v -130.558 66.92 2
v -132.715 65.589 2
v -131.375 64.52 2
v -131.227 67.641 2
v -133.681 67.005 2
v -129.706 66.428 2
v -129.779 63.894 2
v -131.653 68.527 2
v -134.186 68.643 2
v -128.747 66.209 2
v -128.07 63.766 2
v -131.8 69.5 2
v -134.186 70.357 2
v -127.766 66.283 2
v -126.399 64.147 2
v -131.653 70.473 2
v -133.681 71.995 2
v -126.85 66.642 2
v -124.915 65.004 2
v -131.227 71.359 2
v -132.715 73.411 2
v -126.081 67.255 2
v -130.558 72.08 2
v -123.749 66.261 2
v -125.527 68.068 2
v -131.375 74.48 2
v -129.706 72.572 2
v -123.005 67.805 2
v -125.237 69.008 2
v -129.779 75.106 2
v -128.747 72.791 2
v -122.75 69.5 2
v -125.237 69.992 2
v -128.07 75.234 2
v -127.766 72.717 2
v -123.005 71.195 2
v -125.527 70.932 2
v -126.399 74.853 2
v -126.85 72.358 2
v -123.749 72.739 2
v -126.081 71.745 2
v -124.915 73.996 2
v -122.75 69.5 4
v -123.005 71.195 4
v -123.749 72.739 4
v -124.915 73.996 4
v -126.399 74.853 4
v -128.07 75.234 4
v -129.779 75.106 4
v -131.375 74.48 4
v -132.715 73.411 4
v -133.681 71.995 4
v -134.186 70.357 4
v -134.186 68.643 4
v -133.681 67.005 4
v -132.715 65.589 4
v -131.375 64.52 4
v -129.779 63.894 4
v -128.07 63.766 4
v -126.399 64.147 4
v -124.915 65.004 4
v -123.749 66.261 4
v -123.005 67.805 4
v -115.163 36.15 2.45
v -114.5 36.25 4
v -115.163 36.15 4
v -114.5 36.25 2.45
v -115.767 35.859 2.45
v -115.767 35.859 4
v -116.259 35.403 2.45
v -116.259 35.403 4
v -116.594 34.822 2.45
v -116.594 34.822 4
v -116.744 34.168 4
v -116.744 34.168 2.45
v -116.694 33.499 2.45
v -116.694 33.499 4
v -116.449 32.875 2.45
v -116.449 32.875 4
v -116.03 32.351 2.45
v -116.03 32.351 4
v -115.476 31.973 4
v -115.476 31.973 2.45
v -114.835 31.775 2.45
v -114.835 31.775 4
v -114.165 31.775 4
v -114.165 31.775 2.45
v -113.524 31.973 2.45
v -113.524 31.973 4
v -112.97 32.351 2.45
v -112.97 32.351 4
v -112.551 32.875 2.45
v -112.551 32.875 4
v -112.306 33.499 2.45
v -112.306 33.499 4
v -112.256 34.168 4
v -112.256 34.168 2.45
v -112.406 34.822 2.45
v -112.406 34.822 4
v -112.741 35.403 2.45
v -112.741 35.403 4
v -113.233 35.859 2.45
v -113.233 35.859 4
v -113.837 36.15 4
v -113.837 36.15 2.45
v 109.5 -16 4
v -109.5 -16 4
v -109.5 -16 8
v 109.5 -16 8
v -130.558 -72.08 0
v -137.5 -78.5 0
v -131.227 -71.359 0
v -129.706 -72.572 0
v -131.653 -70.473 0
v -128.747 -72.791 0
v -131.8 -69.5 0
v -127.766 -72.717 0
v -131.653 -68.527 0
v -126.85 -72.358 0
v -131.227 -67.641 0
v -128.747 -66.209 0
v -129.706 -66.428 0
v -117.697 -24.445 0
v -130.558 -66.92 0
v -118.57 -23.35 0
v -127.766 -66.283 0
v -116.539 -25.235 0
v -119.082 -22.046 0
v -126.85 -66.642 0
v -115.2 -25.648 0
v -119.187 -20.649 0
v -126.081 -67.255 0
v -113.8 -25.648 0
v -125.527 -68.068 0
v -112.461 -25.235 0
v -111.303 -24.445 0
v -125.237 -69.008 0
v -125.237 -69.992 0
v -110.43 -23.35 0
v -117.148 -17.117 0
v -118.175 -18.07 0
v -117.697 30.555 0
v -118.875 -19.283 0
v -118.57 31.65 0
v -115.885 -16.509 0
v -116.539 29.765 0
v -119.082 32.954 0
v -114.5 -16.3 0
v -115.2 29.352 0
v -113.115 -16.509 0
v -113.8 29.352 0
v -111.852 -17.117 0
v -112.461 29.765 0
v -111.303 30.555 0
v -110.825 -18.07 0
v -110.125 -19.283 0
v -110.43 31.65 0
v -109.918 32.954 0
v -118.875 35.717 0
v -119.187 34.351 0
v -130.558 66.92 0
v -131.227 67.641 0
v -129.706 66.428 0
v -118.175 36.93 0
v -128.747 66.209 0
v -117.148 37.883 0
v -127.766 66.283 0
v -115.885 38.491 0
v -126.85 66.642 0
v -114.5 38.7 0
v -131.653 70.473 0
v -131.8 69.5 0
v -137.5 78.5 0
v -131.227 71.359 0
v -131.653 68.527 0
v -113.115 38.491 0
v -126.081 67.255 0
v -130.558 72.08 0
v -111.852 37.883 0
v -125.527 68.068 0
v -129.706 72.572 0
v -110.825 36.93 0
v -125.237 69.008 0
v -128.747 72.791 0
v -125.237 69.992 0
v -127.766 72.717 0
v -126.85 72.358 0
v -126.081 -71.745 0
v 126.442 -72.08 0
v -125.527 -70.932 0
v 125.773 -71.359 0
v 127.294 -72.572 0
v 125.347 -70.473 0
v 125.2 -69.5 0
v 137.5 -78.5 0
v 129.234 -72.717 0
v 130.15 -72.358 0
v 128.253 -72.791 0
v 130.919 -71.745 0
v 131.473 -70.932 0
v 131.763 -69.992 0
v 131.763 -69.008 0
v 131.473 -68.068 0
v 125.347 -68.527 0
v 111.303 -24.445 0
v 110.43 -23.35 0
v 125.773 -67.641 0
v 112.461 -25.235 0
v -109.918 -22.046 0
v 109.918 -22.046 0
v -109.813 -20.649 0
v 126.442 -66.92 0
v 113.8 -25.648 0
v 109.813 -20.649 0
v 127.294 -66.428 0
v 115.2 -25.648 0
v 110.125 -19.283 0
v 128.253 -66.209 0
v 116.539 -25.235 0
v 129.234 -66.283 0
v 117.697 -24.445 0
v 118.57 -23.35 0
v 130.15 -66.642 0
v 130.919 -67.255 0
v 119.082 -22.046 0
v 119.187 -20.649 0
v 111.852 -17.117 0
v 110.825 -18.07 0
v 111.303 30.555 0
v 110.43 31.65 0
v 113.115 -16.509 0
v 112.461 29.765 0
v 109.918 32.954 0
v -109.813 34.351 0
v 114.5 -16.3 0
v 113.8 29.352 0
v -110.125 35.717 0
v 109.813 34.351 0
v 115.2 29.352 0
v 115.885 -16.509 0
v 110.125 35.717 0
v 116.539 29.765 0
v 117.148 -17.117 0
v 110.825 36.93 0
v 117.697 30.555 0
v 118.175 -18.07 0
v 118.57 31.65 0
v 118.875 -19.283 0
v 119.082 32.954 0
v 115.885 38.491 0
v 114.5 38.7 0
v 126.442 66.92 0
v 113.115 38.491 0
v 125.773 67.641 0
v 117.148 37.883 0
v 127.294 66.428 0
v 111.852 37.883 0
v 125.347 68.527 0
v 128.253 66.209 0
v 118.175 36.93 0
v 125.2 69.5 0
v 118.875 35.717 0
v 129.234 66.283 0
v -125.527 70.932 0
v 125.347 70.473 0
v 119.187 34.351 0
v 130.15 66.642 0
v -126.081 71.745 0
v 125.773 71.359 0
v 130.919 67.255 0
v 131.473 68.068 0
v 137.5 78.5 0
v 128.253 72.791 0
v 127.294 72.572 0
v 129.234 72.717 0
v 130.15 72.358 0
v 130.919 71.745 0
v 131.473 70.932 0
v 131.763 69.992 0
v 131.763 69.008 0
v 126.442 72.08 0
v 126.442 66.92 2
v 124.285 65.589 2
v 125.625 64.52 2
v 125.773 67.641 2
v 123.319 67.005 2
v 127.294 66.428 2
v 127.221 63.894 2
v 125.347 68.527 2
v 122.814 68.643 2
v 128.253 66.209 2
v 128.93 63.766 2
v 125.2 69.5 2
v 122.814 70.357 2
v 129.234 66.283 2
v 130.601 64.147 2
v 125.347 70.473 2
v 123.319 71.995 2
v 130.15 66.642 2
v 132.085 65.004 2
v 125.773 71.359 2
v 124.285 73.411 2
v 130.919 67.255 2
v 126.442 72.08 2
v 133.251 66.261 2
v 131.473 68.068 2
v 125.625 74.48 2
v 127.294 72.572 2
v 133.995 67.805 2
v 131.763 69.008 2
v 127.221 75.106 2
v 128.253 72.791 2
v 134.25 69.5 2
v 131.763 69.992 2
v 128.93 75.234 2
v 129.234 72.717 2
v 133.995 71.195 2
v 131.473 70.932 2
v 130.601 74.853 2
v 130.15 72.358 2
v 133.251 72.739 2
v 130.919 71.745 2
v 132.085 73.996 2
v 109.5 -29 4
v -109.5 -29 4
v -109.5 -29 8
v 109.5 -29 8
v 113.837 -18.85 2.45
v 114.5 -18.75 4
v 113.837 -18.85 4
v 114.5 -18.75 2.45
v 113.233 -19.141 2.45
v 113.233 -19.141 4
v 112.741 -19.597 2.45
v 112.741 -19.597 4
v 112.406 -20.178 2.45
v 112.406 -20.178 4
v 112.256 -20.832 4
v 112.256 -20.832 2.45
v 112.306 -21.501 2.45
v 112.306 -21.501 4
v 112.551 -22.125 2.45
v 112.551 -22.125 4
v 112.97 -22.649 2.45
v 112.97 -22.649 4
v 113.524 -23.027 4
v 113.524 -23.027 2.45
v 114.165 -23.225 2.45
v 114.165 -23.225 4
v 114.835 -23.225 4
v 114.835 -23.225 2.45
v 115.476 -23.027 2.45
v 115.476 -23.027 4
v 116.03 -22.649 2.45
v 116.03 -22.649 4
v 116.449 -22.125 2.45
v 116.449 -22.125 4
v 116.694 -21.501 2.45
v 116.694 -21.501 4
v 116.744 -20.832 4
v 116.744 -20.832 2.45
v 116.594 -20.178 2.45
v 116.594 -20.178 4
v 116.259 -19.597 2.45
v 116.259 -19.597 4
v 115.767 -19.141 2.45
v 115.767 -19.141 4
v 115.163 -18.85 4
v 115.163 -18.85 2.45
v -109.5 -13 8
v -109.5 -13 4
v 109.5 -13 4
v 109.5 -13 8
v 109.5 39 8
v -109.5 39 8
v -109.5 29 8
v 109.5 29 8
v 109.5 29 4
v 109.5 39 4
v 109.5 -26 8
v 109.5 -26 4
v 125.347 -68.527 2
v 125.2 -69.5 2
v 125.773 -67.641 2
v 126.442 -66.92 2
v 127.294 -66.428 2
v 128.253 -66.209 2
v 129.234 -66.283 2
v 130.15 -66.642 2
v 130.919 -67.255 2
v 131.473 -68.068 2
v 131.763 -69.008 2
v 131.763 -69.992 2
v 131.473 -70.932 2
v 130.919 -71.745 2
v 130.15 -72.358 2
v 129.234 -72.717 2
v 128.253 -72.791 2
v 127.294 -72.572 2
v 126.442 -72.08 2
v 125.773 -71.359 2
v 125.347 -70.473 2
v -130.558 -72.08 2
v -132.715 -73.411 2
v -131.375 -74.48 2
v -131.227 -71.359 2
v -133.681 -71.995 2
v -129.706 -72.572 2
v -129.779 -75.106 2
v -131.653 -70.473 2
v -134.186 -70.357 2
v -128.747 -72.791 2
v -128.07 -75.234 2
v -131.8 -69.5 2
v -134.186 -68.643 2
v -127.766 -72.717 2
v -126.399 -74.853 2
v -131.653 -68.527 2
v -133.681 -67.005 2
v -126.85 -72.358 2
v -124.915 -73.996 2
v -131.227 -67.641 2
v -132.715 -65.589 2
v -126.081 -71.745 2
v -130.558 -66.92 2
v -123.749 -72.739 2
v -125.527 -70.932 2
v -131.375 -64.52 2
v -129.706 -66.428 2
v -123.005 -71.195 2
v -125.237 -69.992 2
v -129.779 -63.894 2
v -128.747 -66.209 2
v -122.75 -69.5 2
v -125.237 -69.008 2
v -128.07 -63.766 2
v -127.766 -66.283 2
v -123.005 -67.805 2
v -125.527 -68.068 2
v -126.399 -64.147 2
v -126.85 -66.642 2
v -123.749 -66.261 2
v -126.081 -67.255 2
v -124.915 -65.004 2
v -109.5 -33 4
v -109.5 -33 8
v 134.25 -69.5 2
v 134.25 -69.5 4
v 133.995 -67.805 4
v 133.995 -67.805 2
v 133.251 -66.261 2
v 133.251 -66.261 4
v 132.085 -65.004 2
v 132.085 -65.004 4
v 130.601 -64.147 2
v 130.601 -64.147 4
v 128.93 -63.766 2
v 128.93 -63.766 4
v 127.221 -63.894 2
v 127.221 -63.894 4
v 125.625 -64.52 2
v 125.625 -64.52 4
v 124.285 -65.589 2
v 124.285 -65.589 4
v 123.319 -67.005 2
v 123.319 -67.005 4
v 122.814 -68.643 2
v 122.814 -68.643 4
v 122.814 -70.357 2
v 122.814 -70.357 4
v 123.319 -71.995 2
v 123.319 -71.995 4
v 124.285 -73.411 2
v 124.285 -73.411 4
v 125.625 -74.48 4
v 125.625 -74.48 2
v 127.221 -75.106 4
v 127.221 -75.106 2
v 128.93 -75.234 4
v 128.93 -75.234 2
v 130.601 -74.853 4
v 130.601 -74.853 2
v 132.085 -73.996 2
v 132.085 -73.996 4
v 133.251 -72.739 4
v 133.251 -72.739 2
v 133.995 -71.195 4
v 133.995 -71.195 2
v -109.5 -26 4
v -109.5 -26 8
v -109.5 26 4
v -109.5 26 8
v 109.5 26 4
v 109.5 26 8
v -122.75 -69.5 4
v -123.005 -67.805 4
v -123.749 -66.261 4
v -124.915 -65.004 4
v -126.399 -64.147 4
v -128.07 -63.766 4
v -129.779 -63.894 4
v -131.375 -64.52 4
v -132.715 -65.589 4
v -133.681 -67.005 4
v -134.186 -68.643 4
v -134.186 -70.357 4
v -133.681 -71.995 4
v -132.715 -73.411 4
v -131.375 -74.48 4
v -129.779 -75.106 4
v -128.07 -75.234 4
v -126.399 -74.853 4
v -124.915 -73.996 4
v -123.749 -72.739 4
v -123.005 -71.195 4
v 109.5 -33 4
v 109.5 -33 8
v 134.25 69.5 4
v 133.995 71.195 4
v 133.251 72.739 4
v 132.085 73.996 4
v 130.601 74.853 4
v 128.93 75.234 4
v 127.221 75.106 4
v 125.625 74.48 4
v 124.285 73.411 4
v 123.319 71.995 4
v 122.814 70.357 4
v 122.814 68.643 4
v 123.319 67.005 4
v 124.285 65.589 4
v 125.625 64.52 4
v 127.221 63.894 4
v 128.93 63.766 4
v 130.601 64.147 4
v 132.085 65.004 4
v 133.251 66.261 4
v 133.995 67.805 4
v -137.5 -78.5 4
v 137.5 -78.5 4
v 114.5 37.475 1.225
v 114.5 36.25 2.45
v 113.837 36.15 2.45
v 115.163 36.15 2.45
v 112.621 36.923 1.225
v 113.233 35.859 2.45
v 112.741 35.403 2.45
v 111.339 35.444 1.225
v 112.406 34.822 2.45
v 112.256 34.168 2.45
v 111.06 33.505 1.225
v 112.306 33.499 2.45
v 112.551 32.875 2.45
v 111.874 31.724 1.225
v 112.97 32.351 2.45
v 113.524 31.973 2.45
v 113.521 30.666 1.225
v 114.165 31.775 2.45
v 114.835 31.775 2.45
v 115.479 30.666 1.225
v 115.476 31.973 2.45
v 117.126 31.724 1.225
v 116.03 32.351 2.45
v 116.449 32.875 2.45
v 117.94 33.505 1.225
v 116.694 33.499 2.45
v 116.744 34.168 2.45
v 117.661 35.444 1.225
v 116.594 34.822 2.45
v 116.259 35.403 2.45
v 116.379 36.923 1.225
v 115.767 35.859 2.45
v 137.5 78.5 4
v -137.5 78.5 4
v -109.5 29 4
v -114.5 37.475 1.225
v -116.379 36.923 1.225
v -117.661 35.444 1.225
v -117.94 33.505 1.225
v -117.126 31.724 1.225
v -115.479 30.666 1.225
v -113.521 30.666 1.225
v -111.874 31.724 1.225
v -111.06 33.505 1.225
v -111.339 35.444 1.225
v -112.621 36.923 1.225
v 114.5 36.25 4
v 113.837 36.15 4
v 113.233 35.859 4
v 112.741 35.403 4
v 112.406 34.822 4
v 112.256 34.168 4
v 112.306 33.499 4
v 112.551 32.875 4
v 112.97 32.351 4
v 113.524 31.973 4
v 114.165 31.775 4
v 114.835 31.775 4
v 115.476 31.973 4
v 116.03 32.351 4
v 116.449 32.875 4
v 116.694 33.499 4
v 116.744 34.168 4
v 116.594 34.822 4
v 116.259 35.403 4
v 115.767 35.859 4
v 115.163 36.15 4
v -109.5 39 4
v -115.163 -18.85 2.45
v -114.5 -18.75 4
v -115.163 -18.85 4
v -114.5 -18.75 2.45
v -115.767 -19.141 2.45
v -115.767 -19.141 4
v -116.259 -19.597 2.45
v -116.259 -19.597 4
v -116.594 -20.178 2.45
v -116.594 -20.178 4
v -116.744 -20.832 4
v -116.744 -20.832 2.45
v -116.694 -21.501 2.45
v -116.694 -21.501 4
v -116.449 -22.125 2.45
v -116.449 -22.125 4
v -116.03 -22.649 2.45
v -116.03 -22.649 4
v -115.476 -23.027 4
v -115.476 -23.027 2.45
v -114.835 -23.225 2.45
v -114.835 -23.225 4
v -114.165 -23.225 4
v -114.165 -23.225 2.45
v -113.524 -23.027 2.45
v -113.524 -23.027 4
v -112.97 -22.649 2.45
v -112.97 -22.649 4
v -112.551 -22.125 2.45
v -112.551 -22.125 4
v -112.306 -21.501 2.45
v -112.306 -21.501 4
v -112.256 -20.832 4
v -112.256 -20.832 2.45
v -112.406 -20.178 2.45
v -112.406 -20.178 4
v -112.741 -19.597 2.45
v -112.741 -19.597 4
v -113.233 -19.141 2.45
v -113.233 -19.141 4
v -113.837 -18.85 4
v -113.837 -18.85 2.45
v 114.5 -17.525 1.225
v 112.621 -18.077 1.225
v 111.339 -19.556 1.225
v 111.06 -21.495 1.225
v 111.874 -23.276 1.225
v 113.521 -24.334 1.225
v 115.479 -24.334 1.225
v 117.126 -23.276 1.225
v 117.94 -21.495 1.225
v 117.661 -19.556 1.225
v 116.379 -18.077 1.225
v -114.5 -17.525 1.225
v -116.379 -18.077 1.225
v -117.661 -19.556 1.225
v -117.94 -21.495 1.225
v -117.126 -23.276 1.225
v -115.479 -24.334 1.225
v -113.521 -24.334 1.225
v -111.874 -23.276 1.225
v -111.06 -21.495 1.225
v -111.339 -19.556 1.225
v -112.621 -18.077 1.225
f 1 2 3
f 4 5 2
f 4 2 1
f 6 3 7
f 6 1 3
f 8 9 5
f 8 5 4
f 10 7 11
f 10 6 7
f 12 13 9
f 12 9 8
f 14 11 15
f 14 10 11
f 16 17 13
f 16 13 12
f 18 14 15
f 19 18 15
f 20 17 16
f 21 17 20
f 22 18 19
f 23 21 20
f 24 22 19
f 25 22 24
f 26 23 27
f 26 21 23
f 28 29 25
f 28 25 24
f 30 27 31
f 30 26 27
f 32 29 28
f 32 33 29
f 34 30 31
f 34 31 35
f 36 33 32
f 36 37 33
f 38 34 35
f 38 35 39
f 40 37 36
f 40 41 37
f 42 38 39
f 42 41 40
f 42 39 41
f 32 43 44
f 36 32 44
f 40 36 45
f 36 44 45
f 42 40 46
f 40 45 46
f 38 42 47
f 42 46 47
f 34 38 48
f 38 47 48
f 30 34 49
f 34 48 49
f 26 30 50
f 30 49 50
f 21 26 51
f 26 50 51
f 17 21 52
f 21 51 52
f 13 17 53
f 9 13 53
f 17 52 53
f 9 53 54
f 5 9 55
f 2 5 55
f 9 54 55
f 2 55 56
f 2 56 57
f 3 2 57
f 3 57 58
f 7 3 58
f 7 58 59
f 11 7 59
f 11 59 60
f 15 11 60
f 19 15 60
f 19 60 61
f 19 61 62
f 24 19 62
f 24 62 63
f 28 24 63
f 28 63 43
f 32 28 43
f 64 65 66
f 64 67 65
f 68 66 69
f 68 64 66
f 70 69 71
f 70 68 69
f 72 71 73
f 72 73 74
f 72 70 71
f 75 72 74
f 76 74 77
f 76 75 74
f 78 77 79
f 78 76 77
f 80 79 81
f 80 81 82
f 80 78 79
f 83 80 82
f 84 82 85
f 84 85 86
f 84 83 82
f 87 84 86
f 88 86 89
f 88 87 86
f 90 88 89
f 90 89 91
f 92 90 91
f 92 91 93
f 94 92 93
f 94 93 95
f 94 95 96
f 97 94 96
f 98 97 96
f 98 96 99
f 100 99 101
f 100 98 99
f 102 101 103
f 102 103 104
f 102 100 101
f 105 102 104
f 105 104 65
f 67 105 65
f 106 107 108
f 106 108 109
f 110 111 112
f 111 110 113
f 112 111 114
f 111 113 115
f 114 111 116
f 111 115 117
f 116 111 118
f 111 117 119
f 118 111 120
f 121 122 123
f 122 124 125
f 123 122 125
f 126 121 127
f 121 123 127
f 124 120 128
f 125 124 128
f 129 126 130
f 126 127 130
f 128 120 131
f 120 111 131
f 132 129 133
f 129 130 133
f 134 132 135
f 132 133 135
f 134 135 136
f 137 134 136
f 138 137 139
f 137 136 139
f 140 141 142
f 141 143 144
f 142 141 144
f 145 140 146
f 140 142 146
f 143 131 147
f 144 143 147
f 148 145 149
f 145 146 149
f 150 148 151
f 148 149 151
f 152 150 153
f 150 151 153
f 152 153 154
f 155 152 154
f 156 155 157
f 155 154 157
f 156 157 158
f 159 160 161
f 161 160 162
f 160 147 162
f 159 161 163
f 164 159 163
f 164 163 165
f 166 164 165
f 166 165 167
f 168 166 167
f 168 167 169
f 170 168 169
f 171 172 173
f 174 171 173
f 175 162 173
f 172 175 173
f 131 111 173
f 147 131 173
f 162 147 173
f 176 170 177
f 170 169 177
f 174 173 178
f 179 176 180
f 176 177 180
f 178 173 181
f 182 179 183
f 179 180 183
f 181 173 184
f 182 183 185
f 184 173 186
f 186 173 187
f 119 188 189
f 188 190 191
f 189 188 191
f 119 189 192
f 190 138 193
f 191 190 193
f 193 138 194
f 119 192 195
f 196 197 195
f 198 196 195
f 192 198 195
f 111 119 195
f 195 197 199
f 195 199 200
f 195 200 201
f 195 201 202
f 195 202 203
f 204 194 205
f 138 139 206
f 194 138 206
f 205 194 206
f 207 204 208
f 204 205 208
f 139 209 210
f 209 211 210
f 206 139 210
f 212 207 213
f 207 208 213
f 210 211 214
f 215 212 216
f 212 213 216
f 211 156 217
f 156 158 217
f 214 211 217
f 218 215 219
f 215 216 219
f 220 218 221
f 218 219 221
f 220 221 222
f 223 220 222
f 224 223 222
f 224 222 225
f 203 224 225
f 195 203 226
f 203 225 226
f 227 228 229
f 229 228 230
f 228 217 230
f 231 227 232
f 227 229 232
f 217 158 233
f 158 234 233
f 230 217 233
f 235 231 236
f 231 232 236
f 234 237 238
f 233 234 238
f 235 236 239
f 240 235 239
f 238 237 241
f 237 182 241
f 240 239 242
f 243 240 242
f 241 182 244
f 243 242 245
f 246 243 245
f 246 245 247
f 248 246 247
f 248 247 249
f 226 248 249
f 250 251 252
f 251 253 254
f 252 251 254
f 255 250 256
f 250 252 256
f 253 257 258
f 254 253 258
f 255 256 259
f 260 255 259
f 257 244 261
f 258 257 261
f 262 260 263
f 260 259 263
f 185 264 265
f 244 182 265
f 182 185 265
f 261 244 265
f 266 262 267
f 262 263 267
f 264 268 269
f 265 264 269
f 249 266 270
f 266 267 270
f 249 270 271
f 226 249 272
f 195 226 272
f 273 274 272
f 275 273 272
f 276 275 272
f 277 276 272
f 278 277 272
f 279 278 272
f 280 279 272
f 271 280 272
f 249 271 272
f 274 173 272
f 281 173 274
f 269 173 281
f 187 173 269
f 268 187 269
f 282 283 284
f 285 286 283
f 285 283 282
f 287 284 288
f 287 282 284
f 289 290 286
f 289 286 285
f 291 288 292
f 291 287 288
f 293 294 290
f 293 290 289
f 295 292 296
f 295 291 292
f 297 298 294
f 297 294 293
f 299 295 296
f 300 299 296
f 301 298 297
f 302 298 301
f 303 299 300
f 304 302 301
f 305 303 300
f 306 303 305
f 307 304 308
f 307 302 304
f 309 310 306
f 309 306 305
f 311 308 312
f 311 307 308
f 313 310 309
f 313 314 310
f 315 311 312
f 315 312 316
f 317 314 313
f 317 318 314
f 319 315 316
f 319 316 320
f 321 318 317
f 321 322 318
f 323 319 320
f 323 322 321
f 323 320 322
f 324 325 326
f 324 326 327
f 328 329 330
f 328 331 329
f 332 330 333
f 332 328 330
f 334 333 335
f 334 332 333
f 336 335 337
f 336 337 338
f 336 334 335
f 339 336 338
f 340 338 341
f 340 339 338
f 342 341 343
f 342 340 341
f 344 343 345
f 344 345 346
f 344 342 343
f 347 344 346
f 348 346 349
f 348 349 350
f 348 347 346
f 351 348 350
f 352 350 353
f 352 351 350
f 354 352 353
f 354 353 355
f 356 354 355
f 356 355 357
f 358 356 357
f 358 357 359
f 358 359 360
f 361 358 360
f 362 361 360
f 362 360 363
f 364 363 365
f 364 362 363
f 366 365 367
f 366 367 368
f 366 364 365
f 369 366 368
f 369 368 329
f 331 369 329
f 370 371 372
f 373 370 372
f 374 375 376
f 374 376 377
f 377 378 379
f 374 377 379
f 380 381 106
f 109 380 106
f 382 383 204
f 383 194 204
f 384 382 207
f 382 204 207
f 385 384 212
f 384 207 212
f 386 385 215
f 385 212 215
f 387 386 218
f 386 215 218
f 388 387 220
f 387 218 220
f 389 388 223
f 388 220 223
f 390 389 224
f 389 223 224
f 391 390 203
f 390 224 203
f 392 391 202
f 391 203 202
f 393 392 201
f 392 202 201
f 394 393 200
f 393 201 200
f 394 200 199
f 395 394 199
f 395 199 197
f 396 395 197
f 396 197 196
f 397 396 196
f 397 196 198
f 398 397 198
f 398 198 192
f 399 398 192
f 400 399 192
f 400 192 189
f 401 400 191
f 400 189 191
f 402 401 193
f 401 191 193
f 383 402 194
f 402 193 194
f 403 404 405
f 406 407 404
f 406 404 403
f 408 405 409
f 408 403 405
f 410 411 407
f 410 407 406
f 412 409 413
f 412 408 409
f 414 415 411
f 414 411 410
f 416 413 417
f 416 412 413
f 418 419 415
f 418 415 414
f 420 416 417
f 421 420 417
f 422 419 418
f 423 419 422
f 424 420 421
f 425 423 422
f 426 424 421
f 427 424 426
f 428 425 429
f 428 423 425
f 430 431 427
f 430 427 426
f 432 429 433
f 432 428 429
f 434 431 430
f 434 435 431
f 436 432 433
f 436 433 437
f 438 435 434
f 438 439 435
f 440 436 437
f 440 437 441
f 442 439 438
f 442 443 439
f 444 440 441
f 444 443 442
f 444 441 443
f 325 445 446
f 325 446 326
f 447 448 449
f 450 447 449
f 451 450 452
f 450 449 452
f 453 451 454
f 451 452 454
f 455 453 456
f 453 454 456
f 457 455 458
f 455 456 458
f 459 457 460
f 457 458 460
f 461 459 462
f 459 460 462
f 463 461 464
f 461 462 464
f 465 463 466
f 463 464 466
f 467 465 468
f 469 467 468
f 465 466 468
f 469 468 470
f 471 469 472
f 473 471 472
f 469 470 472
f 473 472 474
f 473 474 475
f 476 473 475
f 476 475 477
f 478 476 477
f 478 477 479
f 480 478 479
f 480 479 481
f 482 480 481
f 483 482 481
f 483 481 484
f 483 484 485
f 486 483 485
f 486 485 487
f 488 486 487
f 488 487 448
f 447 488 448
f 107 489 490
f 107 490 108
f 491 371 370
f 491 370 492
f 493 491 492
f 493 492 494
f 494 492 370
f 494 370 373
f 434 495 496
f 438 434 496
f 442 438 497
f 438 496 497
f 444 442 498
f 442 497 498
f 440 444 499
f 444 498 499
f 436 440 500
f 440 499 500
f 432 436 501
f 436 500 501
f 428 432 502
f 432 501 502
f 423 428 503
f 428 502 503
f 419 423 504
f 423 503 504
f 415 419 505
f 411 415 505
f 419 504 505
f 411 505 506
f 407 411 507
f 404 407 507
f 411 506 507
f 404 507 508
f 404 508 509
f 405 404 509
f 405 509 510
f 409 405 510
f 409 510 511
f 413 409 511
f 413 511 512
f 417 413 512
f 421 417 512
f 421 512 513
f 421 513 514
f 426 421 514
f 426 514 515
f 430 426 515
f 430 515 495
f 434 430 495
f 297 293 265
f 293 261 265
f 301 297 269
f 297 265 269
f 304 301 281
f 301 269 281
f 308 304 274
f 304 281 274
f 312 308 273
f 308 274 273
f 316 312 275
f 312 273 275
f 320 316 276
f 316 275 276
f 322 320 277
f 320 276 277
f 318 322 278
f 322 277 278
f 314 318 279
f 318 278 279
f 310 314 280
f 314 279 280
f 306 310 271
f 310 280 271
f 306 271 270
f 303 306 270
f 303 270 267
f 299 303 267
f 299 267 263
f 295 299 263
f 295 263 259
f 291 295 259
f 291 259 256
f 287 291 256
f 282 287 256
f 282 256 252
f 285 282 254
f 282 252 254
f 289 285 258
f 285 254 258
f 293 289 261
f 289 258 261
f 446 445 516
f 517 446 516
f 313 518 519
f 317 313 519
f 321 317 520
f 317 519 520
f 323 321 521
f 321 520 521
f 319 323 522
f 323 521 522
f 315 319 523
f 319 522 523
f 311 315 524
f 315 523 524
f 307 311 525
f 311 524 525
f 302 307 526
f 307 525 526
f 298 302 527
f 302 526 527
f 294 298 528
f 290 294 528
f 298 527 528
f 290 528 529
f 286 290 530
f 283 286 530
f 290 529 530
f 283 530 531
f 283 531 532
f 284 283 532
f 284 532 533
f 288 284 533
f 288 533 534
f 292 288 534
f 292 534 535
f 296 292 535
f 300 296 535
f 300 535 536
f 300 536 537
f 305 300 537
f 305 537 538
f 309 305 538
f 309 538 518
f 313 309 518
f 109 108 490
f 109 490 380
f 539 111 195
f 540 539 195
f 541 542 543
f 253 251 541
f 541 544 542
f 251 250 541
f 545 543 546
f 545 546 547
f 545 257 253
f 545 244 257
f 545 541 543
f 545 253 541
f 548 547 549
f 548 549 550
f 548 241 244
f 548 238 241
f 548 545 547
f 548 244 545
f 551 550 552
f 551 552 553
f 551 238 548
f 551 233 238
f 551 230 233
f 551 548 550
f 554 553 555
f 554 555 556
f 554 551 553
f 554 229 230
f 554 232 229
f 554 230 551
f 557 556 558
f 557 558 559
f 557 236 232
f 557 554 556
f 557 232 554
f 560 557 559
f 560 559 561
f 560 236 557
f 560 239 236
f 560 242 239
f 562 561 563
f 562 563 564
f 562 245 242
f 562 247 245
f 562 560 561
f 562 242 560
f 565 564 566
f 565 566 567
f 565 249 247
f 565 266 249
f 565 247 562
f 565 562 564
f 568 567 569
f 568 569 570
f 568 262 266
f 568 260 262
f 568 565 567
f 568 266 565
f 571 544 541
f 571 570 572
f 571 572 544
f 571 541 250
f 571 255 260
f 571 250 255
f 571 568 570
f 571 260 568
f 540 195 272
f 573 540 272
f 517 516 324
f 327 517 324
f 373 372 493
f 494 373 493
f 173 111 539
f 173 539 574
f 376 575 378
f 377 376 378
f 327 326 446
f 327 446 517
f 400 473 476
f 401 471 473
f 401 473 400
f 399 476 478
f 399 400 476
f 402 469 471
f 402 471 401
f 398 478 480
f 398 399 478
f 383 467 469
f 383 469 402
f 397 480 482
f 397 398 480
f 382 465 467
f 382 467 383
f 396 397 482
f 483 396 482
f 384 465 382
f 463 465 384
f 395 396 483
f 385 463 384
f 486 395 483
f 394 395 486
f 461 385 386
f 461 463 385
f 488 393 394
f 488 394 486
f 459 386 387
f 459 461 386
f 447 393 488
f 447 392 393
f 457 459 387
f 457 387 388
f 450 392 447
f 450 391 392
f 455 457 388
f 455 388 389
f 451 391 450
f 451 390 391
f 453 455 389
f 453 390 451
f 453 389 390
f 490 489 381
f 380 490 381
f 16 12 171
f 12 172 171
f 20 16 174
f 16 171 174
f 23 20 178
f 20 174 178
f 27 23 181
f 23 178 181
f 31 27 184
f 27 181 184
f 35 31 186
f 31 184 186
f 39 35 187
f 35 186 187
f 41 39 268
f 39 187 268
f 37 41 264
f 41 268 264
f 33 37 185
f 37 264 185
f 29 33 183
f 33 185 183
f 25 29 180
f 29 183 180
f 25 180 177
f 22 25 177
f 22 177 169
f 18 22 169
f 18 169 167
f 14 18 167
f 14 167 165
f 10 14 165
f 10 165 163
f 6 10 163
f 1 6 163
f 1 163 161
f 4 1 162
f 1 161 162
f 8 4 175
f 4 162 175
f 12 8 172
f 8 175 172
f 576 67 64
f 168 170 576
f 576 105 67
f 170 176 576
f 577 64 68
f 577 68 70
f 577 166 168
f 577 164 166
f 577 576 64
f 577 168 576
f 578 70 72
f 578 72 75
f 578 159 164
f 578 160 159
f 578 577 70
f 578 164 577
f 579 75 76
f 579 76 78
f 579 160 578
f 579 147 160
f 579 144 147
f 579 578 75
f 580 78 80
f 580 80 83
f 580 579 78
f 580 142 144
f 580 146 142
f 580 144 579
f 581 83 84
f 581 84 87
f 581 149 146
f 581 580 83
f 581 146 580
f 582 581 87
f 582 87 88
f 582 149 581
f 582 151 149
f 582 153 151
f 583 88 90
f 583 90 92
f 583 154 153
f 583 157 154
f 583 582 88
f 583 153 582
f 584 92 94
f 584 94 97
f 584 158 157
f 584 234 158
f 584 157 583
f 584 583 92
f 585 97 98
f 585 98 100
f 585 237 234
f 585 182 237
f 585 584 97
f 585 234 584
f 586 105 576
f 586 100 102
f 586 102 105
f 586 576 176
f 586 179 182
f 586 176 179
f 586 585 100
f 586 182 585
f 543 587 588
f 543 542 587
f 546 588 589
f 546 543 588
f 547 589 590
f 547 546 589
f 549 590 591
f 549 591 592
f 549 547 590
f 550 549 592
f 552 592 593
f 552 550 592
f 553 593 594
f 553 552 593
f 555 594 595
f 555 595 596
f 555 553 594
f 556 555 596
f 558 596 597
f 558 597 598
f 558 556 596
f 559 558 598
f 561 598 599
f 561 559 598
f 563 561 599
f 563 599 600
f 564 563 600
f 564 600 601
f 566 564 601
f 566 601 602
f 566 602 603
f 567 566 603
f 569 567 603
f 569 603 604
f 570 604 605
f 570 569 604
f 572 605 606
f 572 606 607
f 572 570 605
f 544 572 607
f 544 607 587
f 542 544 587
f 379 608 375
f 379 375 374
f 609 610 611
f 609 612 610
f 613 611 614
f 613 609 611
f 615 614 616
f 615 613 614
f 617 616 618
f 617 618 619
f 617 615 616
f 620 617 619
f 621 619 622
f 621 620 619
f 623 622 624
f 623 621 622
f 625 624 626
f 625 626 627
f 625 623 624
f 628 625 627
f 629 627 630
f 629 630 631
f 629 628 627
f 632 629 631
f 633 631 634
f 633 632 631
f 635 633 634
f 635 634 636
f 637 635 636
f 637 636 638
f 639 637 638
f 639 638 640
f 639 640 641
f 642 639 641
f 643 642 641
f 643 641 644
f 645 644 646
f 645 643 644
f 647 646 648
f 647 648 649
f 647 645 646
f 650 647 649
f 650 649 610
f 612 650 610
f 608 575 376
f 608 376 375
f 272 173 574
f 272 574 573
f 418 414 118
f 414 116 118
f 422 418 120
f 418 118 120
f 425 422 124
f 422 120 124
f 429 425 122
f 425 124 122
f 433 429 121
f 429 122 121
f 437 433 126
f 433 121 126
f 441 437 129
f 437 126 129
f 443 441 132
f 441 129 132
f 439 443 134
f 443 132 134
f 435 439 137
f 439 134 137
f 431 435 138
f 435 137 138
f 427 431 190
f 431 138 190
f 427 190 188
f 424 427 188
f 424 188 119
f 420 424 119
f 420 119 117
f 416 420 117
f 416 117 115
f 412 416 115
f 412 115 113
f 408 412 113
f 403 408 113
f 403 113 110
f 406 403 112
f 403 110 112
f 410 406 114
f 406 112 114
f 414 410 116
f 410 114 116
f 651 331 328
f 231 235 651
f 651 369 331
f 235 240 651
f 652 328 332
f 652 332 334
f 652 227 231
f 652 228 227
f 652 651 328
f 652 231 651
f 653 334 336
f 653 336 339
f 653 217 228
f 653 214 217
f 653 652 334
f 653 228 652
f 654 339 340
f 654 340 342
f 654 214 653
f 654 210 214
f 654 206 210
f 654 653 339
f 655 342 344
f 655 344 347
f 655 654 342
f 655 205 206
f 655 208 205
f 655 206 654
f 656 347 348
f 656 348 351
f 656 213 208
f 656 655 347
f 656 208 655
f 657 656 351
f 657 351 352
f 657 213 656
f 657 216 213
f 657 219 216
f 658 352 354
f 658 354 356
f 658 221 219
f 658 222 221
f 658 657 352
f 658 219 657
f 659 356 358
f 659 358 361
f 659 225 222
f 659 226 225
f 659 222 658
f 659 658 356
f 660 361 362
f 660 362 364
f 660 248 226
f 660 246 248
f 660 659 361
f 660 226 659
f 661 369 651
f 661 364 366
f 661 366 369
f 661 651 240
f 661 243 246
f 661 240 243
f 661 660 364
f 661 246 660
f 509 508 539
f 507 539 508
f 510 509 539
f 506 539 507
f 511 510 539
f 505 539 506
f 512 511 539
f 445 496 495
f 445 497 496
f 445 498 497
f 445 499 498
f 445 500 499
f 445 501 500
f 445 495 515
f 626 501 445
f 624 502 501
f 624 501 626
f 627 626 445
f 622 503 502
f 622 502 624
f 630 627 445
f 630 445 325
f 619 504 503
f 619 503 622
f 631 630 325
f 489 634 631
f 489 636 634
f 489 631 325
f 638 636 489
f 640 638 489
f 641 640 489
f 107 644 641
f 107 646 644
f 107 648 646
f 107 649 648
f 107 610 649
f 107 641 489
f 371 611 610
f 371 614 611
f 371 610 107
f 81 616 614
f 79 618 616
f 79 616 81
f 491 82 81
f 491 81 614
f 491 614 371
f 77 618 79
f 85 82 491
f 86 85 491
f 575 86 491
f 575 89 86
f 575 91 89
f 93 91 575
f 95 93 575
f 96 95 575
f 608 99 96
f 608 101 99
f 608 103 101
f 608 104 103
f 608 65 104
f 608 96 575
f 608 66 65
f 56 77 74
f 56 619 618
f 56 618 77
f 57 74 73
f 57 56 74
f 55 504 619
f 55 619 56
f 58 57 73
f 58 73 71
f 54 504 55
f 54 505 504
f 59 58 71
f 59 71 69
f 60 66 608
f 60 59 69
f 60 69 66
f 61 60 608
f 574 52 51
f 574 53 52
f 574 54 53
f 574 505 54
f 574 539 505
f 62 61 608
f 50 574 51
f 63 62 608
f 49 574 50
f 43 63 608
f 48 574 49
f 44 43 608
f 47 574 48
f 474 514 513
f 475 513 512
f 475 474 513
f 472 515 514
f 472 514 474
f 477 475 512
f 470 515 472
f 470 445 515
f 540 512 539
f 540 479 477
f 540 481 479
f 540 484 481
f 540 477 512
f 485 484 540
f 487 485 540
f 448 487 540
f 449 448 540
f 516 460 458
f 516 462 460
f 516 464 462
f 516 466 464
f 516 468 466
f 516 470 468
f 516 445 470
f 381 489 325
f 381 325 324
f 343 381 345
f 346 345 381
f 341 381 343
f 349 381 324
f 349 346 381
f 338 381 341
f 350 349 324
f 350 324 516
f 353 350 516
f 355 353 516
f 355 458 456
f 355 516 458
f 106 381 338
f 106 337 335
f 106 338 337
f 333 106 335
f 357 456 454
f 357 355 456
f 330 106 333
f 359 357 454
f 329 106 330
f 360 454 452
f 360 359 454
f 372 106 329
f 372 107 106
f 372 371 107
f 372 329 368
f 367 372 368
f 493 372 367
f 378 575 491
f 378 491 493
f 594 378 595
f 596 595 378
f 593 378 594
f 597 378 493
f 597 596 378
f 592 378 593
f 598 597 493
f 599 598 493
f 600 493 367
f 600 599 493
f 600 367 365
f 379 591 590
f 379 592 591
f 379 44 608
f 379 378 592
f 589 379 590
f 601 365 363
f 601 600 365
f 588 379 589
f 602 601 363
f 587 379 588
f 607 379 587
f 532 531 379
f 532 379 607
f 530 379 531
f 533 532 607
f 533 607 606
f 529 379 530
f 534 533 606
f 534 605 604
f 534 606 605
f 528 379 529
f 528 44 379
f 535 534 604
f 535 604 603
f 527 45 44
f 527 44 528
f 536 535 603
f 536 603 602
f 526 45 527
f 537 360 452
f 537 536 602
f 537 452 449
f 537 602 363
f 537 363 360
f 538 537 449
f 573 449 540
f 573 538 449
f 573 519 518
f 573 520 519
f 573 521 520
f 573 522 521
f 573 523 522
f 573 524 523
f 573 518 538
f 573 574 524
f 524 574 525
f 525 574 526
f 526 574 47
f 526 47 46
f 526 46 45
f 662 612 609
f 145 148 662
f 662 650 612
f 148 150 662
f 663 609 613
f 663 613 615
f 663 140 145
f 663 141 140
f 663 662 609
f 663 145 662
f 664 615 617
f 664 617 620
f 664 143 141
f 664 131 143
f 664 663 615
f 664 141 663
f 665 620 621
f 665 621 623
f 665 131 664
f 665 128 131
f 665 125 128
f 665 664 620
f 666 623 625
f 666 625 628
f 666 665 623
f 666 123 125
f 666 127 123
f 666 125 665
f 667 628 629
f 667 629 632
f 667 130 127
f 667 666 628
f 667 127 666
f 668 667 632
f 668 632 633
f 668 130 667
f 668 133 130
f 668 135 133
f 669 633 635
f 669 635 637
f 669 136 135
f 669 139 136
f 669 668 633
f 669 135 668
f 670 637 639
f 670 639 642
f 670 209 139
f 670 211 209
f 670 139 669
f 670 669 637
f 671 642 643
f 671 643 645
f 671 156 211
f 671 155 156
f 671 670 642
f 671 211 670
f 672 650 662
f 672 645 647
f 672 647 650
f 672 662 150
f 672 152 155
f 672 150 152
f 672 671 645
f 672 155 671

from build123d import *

# Parameters (mm, degrees)
ESQUISSE4_W                                      = 275
ESQUISSE4_H                                      = 157
BOSS_EXTRU_2_DEPTH                               = 4
FRAISAGE_POUR_VIS_T_TE_FRAIS_E_M42_AT_COUNT      = 2
FRAISAGE_POUR_VIS_T_TE_FRAIS_E_M42_AT_PITCH      = 235.512207752
FRAISAGE_POUR_VIS_T_TE_FRAIS_E_M42_2_COUNT       = 2
FRAISAGE_POUR_VIS_T_TE_FRAIS_E_M42_2_PITCH       = 229
FRAISAGE_POUR_VIS_T_TE_FRAIS_E_M42_3_COUNT       = 2
FRAISAGE_POUR_VIS_T_TE_FRAIS_E_M42_3_PITCH       = 55
CHAMBRAGE_POUR_VIS_T_TE_RONDE_6_PANS_D           = 6.6
CHAMBRAGE_POUR_VIS_T_TE_RONDE_6_PANS_CBORE_D     = 11.5
CHAMBRAGE_POUR_VIS_T_TE_RONDE_6_PANS_CBORE_DEPTH = 2
ESQUISSE9_W                                      = 219
ESQUISSE9_H                                      = 10
ESQUISSE9_H_2                                    = 39
ESQUISSE9_H_3                                    = 4
BOSS_EXTRU_3_DEPTH                               = 4


with BuildPart() as part:
    # Esquisse4 → Boss.-Extru.2 (new body)
    with BuildSketch(Plane.XY):
        Rectangle(ESQUISSE4_W, ESQUISSE4_H)
    extrude(amount=BOSS_EXTRU_2_DEPTH)

    # Esquisse6 → Fraisage pour vis à tête fraisée M42 (revolve, cut)
    with BuildSketch(Plane(origin=(-114.5, -21, 0), x_dir=(0, 1, 0), z_dir=(1, 0, 0))):
        Polygon((0, 0), (0, 4), (2.25, 4), (2.25, 2.45), (4.7, 0), align=None)
    fraisage_pour_vis_t_te_frais_e_m42 = revolve(axis=Axis((-114.5, -21, -6.35), (0, 0, 1)), mode=Mode.SUBTRACT)

    # Fraisage pour vis à tête fraisée M42 at: Fraisage pour vis à tête fraisée M42 ×2
    with Locations(*[Vector(0.972348747, 0.233533542, 0) * (i * FRAISAGE_POUR_VIS_T_TE_FRAIS_E_M42_AT_PITCH) for i in range(1, FRAISAGE_POUR_VIS_T_TE_FRAIS_E_M42_AT_COUNT)]):
        add(fraisage_pour_vis_t_te_frais_e_m42, mode=Mode.SUBTRACT)

    # Fraisage pour vis _ t_te frais_e M42 2: Fraisage pour vis à tête fraisée M42 ×2
    with Locations(*[(i * FRAISAGE_POUR_VIS_T_TE_FRAIS_E_M42_2_PITCH, 0, 0) for i in range(1, FRAISAGE_POUR_VIS_T_TE_FRAIS_E_M42_2_COUNT)]):
        add(fraisage_pour_vis_t_te_frais_e_m42, mode=Mode.SUBTRACT)

    # Fraisage pour vis _ t_te frais_e M42 3: Fraisage pour vis à tête fraisée M42 ×2
    with Locations(*[(0, i * FRAISAGE_POUR_VIS_T_TE_FRAIS_E_M42_3_PITCH, 0) for i in range(1, FRAISAGE_POUR_VIS_T_TE_FRAIS_E_M42_3_COUNT)]):
        add(fraisage_pour_vis_t_te_frais_e_m42, mode=Mode.SUBTRACT)

    # Chambrage pour Vis à tête ronde à 6 pans creux M61 (through all)
    with Locations(Plane.XY.offset(4)):
        with Locations((128.5, -69.5), (-128.5, -69.5), (-128.5, 69.5), (128.5, 69.5)):
            CounterBoreHole(CHAMBRAGE_POUR_VIS_T_TE_RONDE_6_PANS_D / 2, CHAMBRAGE_POUR_VIS_T_TE_RONDE_6_PANS_CBORE_D / 2, CHAMBRAGE_POUR_VIS_T_TE_RONDE_6_PANS_CBORE_DEPTH)

    # Esquisse9 → Boss.-Extru.3 (add)
    with BuildSketch(Plane.XY.offset(4)):
        with Locations((0, 34)):
            Rectangle(ESQUISSE9_W, ESQUISSE9_H)
        with Locations((0, 6.5)):
            Rectangle(ESQUISSE9_W, ESQUISSE9_H_2)
        with Locations((0, -21)):
            Rectangle(ESQUISSE9_W, ESQUISSE9_H)
        with Locations((0, -31)):
            Rectangle(ESQUISSE9_W, ESQUISSE9_H_3)
    extrude(amount=BOSS_EXTRU_3_DEPTH)


solid = part.part
